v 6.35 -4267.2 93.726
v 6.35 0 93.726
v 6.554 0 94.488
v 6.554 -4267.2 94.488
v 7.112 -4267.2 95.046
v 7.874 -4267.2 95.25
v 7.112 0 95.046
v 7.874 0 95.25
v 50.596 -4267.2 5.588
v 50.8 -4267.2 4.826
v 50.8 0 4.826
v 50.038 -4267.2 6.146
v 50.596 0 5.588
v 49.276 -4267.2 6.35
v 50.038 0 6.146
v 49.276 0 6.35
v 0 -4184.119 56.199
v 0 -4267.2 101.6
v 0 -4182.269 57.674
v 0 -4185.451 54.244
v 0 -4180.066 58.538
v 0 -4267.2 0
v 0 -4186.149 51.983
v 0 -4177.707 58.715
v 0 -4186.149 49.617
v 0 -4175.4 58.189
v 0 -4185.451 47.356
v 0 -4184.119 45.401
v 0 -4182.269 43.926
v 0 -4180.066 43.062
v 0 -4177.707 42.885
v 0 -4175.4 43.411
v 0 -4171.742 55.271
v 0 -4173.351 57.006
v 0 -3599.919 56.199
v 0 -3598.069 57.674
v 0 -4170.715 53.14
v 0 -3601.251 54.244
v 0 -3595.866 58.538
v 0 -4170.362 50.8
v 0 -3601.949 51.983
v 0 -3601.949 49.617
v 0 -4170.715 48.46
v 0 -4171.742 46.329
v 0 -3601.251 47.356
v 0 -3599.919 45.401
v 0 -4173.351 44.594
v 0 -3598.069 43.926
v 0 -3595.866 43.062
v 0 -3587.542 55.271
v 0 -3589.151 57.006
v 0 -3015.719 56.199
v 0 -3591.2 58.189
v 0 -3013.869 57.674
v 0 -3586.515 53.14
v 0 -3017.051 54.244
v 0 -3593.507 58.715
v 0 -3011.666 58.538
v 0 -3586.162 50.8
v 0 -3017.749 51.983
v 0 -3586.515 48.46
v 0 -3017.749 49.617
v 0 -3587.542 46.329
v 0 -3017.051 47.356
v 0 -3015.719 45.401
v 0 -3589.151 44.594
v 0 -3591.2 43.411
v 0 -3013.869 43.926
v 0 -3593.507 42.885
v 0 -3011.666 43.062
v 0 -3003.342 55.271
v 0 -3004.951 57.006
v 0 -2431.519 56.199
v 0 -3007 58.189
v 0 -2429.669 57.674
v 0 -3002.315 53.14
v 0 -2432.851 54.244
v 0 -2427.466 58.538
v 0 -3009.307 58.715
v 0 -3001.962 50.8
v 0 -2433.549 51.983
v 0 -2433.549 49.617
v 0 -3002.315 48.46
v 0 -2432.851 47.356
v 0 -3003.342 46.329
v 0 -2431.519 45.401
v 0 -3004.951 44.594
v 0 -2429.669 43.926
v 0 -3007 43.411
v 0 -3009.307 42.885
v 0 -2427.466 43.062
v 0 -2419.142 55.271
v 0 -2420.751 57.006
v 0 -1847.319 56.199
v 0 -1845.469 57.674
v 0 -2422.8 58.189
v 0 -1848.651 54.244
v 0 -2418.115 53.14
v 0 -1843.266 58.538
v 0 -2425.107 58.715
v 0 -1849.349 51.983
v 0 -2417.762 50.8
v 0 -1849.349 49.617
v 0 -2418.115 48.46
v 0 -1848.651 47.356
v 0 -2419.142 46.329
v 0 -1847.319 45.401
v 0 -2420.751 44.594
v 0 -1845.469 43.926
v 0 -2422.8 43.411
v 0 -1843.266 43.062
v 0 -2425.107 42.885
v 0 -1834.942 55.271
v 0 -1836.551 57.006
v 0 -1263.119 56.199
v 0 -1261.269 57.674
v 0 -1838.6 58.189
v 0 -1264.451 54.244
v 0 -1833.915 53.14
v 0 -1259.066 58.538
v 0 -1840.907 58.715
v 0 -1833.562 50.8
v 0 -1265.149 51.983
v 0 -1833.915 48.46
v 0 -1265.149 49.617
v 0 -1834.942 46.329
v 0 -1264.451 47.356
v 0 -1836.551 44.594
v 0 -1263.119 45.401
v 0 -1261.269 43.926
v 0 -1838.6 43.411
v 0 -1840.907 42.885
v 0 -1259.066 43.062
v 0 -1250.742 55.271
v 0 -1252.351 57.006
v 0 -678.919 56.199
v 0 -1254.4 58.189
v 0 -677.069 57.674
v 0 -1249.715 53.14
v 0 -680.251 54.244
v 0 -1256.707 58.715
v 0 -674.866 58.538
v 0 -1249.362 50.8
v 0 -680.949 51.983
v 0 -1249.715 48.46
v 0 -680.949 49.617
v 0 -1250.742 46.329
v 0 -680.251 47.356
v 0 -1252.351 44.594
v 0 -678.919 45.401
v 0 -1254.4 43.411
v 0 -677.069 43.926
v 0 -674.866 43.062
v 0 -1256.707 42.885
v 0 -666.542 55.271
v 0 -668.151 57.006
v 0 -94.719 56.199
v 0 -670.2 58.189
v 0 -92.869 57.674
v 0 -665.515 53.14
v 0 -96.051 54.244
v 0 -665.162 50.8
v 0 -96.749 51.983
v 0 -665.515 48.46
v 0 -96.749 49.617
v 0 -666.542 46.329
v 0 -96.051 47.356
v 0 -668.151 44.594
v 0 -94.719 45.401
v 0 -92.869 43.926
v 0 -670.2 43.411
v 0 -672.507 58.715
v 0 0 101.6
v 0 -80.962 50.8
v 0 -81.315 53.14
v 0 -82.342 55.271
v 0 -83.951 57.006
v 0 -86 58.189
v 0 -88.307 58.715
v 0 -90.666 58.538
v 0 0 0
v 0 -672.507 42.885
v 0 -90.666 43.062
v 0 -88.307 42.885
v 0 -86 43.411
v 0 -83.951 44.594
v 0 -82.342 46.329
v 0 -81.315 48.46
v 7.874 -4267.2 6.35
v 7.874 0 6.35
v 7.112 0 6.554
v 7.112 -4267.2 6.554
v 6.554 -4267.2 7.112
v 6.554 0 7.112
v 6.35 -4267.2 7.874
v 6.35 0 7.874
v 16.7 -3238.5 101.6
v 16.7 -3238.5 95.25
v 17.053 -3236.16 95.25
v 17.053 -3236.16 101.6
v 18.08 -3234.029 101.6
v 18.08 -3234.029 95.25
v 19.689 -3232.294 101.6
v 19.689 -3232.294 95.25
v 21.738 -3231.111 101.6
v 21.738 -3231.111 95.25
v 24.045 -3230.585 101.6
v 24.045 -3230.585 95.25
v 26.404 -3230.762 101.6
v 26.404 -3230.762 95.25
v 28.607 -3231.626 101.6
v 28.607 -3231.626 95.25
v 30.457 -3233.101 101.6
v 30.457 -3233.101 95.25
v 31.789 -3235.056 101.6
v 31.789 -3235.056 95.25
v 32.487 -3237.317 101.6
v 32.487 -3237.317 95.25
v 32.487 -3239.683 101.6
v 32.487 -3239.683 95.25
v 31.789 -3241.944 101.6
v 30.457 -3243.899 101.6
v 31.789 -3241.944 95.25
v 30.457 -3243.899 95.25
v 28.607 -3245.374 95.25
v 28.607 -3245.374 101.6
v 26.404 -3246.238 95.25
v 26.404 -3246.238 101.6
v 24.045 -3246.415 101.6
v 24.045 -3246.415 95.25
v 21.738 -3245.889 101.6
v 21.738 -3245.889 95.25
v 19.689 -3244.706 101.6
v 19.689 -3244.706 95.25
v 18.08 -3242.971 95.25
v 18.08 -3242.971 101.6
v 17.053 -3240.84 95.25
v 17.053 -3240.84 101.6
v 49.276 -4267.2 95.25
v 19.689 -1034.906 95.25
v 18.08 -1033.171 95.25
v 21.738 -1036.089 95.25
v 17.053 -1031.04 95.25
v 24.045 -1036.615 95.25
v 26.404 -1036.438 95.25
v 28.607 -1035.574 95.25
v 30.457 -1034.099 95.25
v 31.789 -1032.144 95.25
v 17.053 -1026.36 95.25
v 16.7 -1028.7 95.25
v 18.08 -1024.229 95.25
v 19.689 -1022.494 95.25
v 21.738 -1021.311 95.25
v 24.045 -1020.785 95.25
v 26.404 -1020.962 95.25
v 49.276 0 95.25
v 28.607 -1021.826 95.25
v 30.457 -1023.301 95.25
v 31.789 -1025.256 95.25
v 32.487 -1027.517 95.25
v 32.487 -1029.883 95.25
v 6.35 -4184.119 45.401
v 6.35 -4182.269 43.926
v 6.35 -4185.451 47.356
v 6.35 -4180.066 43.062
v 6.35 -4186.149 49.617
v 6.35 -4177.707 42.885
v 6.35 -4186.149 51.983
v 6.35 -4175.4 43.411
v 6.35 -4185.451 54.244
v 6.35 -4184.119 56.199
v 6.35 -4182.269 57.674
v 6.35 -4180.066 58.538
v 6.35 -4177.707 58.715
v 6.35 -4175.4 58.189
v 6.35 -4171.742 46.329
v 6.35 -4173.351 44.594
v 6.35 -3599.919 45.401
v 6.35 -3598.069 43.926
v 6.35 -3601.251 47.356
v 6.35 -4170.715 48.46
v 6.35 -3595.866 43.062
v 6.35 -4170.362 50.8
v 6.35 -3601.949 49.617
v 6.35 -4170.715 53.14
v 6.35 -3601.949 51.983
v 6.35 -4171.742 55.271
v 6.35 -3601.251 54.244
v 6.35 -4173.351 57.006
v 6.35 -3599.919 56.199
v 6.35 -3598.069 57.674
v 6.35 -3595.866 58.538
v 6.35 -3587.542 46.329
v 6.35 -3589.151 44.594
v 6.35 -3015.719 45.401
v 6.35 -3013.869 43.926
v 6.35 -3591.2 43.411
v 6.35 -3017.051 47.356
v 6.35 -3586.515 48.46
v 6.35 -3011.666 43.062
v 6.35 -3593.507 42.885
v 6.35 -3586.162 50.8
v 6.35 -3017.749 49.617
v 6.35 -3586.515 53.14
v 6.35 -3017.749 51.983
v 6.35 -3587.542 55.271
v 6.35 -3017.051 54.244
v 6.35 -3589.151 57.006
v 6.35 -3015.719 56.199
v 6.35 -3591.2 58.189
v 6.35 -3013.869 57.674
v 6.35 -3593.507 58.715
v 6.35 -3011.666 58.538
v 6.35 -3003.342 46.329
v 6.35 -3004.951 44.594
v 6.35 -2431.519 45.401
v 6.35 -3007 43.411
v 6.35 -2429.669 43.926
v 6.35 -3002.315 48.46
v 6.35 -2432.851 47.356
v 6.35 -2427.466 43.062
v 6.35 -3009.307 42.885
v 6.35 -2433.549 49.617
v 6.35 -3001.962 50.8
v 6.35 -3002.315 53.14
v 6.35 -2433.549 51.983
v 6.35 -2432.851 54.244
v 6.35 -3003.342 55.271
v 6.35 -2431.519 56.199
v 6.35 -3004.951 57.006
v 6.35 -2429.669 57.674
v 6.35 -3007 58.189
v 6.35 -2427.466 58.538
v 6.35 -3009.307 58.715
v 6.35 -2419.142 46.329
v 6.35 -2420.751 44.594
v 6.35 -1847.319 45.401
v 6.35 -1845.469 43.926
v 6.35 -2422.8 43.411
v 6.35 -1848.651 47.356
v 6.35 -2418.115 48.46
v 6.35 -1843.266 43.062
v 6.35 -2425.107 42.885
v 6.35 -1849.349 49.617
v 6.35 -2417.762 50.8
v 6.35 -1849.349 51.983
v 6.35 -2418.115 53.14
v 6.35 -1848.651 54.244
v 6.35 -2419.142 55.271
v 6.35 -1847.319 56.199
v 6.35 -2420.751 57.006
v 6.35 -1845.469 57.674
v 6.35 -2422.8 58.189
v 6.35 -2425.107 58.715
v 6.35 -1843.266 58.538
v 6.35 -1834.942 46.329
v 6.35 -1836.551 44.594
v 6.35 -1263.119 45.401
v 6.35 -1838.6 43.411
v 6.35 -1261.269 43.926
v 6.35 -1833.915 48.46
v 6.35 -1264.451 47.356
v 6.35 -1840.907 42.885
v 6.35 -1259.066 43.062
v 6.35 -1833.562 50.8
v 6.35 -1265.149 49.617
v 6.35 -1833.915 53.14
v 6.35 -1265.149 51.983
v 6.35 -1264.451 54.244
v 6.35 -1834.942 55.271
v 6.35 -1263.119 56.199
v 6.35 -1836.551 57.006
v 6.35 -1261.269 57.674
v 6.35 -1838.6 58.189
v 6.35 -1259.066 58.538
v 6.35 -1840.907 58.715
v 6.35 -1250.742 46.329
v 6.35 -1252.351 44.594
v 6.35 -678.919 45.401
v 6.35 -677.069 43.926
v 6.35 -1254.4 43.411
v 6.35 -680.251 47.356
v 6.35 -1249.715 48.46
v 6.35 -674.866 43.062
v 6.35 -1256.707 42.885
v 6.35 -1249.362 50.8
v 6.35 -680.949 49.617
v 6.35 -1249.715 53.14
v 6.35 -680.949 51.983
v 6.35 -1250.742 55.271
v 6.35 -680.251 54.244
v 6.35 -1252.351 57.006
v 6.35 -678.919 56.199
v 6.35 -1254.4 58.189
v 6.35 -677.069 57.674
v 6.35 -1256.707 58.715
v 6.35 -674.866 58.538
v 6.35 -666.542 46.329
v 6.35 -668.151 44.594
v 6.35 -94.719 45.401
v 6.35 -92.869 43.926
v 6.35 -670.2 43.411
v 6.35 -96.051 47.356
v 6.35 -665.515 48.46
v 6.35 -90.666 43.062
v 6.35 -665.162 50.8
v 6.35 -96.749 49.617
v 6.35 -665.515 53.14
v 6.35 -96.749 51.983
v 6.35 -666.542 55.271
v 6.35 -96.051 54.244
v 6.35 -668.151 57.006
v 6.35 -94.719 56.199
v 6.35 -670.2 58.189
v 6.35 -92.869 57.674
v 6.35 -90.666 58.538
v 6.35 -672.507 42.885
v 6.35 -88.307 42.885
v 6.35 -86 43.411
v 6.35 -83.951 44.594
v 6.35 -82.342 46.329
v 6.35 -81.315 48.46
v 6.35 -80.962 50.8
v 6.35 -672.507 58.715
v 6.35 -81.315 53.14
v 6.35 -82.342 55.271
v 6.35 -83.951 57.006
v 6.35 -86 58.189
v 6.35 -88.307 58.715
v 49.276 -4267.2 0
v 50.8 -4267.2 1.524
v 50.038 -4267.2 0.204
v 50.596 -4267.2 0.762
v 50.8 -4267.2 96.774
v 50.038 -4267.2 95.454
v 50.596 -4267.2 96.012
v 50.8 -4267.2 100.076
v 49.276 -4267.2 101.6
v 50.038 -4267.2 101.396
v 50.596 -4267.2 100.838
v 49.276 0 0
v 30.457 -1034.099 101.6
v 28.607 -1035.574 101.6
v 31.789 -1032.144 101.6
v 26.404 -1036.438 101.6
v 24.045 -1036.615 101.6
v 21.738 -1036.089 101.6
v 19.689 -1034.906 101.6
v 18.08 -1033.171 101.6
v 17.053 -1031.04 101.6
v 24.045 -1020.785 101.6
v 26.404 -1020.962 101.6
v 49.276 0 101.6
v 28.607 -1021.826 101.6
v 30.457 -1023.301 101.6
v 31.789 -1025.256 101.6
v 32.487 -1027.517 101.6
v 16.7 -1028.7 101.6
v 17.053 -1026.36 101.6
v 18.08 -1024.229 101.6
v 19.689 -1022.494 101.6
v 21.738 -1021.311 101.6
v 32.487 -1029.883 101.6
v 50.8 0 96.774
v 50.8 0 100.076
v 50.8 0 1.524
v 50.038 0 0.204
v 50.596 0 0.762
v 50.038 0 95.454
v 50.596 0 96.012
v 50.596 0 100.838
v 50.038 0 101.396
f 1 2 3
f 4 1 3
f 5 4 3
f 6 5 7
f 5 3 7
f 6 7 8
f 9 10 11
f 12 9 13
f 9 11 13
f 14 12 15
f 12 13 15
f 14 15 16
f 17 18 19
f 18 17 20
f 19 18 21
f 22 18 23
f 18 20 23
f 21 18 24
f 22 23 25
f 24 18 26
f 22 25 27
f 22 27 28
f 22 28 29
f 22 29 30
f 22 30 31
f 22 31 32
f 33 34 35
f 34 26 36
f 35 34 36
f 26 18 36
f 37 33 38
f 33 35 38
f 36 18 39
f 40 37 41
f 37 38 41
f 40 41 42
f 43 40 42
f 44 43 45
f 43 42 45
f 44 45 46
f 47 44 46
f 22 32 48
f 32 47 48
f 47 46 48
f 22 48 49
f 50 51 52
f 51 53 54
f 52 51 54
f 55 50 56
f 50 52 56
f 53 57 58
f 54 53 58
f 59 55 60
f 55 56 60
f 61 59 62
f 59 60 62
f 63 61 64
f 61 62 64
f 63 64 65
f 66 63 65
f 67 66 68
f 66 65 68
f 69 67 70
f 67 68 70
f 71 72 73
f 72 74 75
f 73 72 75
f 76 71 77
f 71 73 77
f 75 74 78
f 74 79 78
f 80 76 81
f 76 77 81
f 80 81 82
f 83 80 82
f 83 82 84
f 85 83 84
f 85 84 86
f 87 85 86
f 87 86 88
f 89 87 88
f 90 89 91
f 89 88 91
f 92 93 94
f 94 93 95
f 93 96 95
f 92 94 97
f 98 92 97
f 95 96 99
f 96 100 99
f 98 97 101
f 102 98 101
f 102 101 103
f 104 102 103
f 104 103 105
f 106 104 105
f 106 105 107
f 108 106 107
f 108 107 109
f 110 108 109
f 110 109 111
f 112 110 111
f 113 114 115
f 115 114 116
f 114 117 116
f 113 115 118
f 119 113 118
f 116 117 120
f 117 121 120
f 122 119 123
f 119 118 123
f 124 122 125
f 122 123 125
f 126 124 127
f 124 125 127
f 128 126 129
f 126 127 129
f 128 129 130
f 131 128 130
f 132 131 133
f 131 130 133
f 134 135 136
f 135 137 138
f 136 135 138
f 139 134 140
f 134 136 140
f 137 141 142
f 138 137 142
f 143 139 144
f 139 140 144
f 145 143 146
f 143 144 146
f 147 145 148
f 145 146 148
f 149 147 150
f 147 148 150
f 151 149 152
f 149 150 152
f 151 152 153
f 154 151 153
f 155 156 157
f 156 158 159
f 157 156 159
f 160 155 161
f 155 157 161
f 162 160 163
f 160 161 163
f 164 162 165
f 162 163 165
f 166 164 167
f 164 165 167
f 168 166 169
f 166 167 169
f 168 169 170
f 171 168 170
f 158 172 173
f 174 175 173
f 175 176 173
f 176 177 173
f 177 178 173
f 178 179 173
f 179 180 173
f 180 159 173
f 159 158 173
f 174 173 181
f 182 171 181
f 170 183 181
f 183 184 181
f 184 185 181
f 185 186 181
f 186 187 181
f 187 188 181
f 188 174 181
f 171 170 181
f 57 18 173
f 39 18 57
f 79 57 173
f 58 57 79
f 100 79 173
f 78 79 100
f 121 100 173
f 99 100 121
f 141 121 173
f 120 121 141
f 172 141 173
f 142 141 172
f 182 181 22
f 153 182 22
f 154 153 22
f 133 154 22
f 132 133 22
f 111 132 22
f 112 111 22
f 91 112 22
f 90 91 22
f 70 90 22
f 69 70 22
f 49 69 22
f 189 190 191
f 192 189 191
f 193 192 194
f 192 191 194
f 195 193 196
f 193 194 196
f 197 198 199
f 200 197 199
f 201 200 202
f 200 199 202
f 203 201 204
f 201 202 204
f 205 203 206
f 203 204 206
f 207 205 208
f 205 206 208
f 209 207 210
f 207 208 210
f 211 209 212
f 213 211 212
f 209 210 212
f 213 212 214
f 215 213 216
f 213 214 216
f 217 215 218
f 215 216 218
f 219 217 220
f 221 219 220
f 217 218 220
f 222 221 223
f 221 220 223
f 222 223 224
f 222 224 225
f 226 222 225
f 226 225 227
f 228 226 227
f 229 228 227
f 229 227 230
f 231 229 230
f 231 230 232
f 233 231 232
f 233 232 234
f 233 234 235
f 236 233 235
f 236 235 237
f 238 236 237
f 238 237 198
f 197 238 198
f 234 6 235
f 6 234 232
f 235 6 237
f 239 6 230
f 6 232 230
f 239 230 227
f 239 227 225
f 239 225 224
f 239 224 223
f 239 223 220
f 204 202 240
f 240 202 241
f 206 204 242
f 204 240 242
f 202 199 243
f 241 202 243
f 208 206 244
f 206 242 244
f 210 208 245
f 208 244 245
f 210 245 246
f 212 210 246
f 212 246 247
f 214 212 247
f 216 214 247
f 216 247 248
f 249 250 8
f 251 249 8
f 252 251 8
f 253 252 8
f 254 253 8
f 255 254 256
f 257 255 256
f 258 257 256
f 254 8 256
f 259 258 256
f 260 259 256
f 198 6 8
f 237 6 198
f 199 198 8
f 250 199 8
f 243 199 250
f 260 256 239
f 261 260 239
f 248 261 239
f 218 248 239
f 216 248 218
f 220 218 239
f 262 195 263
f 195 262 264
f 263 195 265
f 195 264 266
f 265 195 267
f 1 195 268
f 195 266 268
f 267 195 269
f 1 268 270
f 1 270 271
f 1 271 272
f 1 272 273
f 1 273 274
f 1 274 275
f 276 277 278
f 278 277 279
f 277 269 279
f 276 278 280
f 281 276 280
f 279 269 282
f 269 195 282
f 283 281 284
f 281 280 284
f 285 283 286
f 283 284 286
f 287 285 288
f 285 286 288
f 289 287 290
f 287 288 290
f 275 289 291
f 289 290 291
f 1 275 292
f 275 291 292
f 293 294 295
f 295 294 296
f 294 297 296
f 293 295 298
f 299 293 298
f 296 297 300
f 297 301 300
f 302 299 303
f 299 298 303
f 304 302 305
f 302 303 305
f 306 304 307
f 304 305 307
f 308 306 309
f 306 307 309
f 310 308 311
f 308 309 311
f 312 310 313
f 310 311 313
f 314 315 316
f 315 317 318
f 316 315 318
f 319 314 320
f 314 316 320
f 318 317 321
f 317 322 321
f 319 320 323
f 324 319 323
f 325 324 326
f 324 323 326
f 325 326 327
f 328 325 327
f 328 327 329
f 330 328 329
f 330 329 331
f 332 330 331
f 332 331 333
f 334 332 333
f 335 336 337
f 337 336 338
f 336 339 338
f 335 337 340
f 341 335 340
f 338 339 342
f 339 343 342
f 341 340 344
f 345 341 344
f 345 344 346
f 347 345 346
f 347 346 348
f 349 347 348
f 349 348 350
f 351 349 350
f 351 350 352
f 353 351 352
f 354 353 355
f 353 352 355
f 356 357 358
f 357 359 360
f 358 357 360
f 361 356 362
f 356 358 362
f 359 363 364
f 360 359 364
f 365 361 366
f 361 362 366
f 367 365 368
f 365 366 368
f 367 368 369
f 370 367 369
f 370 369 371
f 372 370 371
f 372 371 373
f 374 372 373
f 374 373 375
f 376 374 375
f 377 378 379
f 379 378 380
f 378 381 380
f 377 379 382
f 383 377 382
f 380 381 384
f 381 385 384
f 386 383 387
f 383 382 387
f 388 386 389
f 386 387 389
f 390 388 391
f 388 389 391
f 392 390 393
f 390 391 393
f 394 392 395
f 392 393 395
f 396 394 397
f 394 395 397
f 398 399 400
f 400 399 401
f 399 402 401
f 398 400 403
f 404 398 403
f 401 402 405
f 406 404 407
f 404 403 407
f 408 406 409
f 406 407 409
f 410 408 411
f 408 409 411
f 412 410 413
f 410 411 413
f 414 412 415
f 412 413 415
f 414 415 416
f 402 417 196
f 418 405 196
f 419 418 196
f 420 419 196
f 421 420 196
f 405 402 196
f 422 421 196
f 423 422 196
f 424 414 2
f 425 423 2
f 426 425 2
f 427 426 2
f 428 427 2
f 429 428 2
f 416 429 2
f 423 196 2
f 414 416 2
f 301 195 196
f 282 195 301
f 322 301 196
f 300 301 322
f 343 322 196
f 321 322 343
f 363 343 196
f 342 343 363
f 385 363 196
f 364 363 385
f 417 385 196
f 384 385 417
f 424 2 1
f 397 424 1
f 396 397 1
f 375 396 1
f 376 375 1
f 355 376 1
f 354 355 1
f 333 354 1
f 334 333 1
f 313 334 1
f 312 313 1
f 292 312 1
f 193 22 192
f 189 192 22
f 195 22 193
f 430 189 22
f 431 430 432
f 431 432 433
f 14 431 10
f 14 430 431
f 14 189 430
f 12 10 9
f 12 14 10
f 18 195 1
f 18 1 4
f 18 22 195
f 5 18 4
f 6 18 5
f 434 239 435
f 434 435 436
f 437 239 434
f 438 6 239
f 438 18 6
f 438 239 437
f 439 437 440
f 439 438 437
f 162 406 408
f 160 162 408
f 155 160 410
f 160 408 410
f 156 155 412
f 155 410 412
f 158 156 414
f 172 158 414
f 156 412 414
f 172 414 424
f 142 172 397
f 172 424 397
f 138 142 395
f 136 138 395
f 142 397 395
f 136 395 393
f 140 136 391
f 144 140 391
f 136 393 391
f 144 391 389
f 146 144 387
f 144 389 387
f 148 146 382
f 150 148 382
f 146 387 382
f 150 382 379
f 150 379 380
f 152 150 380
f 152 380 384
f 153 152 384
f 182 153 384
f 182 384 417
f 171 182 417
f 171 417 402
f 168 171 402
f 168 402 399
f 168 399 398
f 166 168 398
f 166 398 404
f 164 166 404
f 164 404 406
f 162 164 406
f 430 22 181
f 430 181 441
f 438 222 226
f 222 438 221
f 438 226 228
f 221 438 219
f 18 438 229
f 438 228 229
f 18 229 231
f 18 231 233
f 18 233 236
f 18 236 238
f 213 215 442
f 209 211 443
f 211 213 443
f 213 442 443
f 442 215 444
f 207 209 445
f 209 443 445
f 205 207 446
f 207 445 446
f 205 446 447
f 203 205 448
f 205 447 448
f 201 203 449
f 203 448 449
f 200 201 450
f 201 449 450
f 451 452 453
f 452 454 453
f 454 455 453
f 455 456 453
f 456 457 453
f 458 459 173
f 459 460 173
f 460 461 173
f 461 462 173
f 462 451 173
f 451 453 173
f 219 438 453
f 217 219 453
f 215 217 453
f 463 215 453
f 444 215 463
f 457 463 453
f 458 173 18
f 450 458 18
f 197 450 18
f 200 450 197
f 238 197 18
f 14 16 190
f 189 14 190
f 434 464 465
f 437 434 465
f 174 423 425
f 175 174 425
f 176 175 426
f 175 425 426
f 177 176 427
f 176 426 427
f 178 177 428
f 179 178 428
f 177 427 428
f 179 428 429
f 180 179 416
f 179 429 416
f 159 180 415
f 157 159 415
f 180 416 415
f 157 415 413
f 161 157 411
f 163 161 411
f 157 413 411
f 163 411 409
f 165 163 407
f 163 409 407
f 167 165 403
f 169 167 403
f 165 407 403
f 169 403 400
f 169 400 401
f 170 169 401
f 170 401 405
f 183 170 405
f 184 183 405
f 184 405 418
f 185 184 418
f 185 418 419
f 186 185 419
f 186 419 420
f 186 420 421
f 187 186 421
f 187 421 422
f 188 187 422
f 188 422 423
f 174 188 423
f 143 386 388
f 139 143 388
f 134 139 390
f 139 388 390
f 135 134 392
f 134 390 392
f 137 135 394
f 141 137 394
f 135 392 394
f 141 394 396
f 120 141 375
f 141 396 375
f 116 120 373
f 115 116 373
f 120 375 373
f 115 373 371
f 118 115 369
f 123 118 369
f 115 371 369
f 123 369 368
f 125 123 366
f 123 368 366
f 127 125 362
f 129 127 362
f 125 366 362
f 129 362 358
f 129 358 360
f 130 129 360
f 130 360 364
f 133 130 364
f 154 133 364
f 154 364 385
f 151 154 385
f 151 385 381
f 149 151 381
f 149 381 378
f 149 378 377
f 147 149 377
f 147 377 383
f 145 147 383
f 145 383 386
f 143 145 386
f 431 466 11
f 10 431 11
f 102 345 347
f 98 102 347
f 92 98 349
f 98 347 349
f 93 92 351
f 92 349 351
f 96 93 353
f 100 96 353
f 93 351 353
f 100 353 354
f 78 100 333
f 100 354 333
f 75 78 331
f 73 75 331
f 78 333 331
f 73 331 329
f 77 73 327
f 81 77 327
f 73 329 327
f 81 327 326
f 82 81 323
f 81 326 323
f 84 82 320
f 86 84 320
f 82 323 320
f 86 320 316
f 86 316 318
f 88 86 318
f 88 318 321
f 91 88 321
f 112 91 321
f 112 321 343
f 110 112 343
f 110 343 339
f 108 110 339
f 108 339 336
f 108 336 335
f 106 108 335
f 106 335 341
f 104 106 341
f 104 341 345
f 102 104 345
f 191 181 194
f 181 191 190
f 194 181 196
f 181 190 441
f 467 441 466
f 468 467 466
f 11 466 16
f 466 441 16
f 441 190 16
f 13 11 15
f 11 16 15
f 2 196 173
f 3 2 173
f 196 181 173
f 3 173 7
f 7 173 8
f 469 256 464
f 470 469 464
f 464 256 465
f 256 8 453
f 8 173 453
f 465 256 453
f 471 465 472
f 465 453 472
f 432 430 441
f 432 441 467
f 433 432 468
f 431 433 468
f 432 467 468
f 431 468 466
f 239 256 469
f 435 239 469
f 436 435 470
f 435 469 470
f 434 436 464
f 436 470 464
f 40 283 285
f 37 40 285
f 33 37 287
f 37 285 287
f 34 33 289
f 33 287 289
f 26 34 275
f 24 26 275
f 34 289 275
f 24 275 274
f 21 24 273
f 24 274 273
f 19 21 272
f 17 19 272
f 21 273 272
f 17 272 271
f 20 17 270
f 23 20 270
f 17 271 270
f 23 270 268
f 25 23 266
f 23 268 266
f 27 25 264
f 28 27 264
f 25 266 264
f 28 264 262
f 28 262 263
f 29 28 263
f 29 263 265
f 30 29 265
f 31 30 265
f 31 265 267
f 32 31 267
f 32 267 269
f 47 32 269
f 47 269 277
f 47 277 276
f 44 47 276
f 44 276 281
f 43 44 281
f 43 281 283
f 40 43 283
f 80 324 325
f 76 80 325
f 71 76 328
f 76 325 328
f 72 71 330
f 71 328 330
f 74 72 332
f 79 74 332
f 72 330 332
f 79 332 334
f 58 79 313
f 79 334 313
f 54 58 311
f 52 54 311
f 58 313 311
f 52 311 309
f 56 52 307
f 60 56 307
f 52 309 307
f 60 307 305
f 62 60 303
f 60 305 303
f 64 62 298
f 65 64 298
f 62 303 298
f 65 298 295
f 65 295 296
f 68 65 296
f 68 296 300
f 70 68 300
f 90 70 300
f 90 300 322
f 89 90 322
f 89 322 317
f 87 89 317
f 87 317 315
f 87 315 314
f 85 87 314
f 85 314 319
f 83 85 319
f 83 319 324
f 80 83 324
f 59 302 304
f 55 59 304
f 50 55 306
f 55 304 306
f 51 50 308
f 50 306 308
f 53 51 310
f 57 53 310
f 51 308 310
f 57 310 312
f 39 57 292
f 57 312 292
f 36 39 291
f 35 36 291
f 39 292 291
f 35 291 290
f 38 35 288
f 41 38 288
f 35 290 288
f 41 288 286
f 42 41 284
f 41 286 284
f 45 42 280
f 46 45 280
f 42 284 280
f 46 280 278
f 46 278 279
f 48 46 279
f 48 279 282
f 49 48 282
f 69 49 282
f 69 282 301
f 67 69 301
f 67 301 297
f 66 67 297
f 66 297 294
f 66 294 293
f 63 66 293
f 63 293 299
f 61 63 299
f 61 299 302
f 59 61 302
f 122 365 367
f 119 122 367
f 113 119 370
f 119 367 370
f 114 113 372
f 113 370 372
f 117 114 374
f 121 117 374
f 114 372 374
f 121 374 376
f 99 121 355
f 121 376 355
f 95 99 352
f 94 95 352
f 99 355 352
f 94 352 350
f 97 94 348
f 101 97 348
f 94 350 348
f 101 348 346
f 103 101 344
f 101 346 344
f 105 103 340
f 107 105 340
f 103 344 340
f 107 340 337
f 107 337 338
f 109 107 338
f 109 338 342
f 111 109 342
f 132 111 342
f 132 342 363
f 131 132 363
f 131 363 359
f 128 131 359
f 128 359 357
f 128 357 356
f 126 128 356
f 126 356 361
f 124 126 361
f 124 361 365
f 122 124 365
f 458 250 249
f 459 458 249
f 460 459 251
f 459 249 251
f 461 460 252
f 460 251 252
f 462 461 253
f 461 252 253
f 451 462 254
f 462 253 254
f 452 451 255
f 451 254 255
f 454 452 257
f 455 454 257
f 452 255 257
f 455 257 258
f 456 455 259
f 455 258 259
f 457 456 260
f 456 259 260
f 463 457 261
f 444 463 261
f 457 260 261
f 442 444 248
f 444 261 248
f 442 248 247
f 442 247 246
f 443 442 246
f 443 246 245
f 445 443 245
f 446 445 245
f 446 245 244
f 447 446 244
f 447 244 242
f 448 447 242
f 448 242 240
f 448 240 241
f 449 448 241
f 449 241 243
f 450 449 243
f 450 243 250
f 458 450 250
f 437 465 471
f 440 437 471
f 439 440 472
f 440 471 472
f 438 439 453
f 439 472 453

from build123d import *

# Parameters (mm, degrees)
F1_DEPTH = 4267.2
F3_D     = 15.875
F3_DEPTH = 6.35
F5_D     = 15.875
F5_DEPTH = 6.35


with BuildPart() as f1:
    # F0 (on Front) → F1 (new body)
    with BuildSketch(Plane.XZ):
        with BuildLine():
            Line((0, 101.6), (0, 0))
            Line((0, 0), (49.276, 0))
            ThreePointArc((49.276, 0), (50.353631, 0.446369), (50.8, 1.524))
            Line((50.8, 1.524), (50.8, 4.826))
            ThreePointArc((50.8, 4.826), (50.353631, 5.903631), (49.276, 6.35))
            Line((49.276, 6.35), (7.874, 6.35))
            ThreePointArc((7.874, 6.35), (6.796369, 6.796369), (6.35, 7.874))
            Line((6.35, 7.874), (6.35, 93.726))
            ThreePointArc((6.35, 93.726), (6.796369, 94.803631), (7.874, 95.25))
            Line((7.874, 95.25), (49.276, 95.25))
            ThreePointArc((49.276, 95.25), (50.353631, 95.696369), (50.8, 96.774))
            Line((50.8, 96.774), (50.8, 100.076))
            ThreePointArc((50.8, 100.076), (50.353631, 101.153631), (49.276, 101.6))
            Line((49.276, 101.6), (0, 101.6))
        make_face()
    extrude(amount=F1_DEPTH)

    # F3
    with Locations(Plane.XY.offset(101.6)):
        with Locations((24.638, -3238.5), (24.638, -1028.7)):
            Hole(F3_D / 2, depth=F3_DEPTH)

    # F5
    with Locations(Plane(origin=(0, 0, 0), x_dir=(0, -1, 0), z_dir=(-1, 0, 0))):
        with Locations((88.9, 50.8), (673.1, 50.8), (1257.3, 50.8), (1841.5, 50.8), (2425.7, 50.8), (3009.9, 50.8), (3594.1, 50.8), (4178.3, 50.8)):
            Hole(F5_D / 2, depth=F5_DEPTH)


solid = f1.part
